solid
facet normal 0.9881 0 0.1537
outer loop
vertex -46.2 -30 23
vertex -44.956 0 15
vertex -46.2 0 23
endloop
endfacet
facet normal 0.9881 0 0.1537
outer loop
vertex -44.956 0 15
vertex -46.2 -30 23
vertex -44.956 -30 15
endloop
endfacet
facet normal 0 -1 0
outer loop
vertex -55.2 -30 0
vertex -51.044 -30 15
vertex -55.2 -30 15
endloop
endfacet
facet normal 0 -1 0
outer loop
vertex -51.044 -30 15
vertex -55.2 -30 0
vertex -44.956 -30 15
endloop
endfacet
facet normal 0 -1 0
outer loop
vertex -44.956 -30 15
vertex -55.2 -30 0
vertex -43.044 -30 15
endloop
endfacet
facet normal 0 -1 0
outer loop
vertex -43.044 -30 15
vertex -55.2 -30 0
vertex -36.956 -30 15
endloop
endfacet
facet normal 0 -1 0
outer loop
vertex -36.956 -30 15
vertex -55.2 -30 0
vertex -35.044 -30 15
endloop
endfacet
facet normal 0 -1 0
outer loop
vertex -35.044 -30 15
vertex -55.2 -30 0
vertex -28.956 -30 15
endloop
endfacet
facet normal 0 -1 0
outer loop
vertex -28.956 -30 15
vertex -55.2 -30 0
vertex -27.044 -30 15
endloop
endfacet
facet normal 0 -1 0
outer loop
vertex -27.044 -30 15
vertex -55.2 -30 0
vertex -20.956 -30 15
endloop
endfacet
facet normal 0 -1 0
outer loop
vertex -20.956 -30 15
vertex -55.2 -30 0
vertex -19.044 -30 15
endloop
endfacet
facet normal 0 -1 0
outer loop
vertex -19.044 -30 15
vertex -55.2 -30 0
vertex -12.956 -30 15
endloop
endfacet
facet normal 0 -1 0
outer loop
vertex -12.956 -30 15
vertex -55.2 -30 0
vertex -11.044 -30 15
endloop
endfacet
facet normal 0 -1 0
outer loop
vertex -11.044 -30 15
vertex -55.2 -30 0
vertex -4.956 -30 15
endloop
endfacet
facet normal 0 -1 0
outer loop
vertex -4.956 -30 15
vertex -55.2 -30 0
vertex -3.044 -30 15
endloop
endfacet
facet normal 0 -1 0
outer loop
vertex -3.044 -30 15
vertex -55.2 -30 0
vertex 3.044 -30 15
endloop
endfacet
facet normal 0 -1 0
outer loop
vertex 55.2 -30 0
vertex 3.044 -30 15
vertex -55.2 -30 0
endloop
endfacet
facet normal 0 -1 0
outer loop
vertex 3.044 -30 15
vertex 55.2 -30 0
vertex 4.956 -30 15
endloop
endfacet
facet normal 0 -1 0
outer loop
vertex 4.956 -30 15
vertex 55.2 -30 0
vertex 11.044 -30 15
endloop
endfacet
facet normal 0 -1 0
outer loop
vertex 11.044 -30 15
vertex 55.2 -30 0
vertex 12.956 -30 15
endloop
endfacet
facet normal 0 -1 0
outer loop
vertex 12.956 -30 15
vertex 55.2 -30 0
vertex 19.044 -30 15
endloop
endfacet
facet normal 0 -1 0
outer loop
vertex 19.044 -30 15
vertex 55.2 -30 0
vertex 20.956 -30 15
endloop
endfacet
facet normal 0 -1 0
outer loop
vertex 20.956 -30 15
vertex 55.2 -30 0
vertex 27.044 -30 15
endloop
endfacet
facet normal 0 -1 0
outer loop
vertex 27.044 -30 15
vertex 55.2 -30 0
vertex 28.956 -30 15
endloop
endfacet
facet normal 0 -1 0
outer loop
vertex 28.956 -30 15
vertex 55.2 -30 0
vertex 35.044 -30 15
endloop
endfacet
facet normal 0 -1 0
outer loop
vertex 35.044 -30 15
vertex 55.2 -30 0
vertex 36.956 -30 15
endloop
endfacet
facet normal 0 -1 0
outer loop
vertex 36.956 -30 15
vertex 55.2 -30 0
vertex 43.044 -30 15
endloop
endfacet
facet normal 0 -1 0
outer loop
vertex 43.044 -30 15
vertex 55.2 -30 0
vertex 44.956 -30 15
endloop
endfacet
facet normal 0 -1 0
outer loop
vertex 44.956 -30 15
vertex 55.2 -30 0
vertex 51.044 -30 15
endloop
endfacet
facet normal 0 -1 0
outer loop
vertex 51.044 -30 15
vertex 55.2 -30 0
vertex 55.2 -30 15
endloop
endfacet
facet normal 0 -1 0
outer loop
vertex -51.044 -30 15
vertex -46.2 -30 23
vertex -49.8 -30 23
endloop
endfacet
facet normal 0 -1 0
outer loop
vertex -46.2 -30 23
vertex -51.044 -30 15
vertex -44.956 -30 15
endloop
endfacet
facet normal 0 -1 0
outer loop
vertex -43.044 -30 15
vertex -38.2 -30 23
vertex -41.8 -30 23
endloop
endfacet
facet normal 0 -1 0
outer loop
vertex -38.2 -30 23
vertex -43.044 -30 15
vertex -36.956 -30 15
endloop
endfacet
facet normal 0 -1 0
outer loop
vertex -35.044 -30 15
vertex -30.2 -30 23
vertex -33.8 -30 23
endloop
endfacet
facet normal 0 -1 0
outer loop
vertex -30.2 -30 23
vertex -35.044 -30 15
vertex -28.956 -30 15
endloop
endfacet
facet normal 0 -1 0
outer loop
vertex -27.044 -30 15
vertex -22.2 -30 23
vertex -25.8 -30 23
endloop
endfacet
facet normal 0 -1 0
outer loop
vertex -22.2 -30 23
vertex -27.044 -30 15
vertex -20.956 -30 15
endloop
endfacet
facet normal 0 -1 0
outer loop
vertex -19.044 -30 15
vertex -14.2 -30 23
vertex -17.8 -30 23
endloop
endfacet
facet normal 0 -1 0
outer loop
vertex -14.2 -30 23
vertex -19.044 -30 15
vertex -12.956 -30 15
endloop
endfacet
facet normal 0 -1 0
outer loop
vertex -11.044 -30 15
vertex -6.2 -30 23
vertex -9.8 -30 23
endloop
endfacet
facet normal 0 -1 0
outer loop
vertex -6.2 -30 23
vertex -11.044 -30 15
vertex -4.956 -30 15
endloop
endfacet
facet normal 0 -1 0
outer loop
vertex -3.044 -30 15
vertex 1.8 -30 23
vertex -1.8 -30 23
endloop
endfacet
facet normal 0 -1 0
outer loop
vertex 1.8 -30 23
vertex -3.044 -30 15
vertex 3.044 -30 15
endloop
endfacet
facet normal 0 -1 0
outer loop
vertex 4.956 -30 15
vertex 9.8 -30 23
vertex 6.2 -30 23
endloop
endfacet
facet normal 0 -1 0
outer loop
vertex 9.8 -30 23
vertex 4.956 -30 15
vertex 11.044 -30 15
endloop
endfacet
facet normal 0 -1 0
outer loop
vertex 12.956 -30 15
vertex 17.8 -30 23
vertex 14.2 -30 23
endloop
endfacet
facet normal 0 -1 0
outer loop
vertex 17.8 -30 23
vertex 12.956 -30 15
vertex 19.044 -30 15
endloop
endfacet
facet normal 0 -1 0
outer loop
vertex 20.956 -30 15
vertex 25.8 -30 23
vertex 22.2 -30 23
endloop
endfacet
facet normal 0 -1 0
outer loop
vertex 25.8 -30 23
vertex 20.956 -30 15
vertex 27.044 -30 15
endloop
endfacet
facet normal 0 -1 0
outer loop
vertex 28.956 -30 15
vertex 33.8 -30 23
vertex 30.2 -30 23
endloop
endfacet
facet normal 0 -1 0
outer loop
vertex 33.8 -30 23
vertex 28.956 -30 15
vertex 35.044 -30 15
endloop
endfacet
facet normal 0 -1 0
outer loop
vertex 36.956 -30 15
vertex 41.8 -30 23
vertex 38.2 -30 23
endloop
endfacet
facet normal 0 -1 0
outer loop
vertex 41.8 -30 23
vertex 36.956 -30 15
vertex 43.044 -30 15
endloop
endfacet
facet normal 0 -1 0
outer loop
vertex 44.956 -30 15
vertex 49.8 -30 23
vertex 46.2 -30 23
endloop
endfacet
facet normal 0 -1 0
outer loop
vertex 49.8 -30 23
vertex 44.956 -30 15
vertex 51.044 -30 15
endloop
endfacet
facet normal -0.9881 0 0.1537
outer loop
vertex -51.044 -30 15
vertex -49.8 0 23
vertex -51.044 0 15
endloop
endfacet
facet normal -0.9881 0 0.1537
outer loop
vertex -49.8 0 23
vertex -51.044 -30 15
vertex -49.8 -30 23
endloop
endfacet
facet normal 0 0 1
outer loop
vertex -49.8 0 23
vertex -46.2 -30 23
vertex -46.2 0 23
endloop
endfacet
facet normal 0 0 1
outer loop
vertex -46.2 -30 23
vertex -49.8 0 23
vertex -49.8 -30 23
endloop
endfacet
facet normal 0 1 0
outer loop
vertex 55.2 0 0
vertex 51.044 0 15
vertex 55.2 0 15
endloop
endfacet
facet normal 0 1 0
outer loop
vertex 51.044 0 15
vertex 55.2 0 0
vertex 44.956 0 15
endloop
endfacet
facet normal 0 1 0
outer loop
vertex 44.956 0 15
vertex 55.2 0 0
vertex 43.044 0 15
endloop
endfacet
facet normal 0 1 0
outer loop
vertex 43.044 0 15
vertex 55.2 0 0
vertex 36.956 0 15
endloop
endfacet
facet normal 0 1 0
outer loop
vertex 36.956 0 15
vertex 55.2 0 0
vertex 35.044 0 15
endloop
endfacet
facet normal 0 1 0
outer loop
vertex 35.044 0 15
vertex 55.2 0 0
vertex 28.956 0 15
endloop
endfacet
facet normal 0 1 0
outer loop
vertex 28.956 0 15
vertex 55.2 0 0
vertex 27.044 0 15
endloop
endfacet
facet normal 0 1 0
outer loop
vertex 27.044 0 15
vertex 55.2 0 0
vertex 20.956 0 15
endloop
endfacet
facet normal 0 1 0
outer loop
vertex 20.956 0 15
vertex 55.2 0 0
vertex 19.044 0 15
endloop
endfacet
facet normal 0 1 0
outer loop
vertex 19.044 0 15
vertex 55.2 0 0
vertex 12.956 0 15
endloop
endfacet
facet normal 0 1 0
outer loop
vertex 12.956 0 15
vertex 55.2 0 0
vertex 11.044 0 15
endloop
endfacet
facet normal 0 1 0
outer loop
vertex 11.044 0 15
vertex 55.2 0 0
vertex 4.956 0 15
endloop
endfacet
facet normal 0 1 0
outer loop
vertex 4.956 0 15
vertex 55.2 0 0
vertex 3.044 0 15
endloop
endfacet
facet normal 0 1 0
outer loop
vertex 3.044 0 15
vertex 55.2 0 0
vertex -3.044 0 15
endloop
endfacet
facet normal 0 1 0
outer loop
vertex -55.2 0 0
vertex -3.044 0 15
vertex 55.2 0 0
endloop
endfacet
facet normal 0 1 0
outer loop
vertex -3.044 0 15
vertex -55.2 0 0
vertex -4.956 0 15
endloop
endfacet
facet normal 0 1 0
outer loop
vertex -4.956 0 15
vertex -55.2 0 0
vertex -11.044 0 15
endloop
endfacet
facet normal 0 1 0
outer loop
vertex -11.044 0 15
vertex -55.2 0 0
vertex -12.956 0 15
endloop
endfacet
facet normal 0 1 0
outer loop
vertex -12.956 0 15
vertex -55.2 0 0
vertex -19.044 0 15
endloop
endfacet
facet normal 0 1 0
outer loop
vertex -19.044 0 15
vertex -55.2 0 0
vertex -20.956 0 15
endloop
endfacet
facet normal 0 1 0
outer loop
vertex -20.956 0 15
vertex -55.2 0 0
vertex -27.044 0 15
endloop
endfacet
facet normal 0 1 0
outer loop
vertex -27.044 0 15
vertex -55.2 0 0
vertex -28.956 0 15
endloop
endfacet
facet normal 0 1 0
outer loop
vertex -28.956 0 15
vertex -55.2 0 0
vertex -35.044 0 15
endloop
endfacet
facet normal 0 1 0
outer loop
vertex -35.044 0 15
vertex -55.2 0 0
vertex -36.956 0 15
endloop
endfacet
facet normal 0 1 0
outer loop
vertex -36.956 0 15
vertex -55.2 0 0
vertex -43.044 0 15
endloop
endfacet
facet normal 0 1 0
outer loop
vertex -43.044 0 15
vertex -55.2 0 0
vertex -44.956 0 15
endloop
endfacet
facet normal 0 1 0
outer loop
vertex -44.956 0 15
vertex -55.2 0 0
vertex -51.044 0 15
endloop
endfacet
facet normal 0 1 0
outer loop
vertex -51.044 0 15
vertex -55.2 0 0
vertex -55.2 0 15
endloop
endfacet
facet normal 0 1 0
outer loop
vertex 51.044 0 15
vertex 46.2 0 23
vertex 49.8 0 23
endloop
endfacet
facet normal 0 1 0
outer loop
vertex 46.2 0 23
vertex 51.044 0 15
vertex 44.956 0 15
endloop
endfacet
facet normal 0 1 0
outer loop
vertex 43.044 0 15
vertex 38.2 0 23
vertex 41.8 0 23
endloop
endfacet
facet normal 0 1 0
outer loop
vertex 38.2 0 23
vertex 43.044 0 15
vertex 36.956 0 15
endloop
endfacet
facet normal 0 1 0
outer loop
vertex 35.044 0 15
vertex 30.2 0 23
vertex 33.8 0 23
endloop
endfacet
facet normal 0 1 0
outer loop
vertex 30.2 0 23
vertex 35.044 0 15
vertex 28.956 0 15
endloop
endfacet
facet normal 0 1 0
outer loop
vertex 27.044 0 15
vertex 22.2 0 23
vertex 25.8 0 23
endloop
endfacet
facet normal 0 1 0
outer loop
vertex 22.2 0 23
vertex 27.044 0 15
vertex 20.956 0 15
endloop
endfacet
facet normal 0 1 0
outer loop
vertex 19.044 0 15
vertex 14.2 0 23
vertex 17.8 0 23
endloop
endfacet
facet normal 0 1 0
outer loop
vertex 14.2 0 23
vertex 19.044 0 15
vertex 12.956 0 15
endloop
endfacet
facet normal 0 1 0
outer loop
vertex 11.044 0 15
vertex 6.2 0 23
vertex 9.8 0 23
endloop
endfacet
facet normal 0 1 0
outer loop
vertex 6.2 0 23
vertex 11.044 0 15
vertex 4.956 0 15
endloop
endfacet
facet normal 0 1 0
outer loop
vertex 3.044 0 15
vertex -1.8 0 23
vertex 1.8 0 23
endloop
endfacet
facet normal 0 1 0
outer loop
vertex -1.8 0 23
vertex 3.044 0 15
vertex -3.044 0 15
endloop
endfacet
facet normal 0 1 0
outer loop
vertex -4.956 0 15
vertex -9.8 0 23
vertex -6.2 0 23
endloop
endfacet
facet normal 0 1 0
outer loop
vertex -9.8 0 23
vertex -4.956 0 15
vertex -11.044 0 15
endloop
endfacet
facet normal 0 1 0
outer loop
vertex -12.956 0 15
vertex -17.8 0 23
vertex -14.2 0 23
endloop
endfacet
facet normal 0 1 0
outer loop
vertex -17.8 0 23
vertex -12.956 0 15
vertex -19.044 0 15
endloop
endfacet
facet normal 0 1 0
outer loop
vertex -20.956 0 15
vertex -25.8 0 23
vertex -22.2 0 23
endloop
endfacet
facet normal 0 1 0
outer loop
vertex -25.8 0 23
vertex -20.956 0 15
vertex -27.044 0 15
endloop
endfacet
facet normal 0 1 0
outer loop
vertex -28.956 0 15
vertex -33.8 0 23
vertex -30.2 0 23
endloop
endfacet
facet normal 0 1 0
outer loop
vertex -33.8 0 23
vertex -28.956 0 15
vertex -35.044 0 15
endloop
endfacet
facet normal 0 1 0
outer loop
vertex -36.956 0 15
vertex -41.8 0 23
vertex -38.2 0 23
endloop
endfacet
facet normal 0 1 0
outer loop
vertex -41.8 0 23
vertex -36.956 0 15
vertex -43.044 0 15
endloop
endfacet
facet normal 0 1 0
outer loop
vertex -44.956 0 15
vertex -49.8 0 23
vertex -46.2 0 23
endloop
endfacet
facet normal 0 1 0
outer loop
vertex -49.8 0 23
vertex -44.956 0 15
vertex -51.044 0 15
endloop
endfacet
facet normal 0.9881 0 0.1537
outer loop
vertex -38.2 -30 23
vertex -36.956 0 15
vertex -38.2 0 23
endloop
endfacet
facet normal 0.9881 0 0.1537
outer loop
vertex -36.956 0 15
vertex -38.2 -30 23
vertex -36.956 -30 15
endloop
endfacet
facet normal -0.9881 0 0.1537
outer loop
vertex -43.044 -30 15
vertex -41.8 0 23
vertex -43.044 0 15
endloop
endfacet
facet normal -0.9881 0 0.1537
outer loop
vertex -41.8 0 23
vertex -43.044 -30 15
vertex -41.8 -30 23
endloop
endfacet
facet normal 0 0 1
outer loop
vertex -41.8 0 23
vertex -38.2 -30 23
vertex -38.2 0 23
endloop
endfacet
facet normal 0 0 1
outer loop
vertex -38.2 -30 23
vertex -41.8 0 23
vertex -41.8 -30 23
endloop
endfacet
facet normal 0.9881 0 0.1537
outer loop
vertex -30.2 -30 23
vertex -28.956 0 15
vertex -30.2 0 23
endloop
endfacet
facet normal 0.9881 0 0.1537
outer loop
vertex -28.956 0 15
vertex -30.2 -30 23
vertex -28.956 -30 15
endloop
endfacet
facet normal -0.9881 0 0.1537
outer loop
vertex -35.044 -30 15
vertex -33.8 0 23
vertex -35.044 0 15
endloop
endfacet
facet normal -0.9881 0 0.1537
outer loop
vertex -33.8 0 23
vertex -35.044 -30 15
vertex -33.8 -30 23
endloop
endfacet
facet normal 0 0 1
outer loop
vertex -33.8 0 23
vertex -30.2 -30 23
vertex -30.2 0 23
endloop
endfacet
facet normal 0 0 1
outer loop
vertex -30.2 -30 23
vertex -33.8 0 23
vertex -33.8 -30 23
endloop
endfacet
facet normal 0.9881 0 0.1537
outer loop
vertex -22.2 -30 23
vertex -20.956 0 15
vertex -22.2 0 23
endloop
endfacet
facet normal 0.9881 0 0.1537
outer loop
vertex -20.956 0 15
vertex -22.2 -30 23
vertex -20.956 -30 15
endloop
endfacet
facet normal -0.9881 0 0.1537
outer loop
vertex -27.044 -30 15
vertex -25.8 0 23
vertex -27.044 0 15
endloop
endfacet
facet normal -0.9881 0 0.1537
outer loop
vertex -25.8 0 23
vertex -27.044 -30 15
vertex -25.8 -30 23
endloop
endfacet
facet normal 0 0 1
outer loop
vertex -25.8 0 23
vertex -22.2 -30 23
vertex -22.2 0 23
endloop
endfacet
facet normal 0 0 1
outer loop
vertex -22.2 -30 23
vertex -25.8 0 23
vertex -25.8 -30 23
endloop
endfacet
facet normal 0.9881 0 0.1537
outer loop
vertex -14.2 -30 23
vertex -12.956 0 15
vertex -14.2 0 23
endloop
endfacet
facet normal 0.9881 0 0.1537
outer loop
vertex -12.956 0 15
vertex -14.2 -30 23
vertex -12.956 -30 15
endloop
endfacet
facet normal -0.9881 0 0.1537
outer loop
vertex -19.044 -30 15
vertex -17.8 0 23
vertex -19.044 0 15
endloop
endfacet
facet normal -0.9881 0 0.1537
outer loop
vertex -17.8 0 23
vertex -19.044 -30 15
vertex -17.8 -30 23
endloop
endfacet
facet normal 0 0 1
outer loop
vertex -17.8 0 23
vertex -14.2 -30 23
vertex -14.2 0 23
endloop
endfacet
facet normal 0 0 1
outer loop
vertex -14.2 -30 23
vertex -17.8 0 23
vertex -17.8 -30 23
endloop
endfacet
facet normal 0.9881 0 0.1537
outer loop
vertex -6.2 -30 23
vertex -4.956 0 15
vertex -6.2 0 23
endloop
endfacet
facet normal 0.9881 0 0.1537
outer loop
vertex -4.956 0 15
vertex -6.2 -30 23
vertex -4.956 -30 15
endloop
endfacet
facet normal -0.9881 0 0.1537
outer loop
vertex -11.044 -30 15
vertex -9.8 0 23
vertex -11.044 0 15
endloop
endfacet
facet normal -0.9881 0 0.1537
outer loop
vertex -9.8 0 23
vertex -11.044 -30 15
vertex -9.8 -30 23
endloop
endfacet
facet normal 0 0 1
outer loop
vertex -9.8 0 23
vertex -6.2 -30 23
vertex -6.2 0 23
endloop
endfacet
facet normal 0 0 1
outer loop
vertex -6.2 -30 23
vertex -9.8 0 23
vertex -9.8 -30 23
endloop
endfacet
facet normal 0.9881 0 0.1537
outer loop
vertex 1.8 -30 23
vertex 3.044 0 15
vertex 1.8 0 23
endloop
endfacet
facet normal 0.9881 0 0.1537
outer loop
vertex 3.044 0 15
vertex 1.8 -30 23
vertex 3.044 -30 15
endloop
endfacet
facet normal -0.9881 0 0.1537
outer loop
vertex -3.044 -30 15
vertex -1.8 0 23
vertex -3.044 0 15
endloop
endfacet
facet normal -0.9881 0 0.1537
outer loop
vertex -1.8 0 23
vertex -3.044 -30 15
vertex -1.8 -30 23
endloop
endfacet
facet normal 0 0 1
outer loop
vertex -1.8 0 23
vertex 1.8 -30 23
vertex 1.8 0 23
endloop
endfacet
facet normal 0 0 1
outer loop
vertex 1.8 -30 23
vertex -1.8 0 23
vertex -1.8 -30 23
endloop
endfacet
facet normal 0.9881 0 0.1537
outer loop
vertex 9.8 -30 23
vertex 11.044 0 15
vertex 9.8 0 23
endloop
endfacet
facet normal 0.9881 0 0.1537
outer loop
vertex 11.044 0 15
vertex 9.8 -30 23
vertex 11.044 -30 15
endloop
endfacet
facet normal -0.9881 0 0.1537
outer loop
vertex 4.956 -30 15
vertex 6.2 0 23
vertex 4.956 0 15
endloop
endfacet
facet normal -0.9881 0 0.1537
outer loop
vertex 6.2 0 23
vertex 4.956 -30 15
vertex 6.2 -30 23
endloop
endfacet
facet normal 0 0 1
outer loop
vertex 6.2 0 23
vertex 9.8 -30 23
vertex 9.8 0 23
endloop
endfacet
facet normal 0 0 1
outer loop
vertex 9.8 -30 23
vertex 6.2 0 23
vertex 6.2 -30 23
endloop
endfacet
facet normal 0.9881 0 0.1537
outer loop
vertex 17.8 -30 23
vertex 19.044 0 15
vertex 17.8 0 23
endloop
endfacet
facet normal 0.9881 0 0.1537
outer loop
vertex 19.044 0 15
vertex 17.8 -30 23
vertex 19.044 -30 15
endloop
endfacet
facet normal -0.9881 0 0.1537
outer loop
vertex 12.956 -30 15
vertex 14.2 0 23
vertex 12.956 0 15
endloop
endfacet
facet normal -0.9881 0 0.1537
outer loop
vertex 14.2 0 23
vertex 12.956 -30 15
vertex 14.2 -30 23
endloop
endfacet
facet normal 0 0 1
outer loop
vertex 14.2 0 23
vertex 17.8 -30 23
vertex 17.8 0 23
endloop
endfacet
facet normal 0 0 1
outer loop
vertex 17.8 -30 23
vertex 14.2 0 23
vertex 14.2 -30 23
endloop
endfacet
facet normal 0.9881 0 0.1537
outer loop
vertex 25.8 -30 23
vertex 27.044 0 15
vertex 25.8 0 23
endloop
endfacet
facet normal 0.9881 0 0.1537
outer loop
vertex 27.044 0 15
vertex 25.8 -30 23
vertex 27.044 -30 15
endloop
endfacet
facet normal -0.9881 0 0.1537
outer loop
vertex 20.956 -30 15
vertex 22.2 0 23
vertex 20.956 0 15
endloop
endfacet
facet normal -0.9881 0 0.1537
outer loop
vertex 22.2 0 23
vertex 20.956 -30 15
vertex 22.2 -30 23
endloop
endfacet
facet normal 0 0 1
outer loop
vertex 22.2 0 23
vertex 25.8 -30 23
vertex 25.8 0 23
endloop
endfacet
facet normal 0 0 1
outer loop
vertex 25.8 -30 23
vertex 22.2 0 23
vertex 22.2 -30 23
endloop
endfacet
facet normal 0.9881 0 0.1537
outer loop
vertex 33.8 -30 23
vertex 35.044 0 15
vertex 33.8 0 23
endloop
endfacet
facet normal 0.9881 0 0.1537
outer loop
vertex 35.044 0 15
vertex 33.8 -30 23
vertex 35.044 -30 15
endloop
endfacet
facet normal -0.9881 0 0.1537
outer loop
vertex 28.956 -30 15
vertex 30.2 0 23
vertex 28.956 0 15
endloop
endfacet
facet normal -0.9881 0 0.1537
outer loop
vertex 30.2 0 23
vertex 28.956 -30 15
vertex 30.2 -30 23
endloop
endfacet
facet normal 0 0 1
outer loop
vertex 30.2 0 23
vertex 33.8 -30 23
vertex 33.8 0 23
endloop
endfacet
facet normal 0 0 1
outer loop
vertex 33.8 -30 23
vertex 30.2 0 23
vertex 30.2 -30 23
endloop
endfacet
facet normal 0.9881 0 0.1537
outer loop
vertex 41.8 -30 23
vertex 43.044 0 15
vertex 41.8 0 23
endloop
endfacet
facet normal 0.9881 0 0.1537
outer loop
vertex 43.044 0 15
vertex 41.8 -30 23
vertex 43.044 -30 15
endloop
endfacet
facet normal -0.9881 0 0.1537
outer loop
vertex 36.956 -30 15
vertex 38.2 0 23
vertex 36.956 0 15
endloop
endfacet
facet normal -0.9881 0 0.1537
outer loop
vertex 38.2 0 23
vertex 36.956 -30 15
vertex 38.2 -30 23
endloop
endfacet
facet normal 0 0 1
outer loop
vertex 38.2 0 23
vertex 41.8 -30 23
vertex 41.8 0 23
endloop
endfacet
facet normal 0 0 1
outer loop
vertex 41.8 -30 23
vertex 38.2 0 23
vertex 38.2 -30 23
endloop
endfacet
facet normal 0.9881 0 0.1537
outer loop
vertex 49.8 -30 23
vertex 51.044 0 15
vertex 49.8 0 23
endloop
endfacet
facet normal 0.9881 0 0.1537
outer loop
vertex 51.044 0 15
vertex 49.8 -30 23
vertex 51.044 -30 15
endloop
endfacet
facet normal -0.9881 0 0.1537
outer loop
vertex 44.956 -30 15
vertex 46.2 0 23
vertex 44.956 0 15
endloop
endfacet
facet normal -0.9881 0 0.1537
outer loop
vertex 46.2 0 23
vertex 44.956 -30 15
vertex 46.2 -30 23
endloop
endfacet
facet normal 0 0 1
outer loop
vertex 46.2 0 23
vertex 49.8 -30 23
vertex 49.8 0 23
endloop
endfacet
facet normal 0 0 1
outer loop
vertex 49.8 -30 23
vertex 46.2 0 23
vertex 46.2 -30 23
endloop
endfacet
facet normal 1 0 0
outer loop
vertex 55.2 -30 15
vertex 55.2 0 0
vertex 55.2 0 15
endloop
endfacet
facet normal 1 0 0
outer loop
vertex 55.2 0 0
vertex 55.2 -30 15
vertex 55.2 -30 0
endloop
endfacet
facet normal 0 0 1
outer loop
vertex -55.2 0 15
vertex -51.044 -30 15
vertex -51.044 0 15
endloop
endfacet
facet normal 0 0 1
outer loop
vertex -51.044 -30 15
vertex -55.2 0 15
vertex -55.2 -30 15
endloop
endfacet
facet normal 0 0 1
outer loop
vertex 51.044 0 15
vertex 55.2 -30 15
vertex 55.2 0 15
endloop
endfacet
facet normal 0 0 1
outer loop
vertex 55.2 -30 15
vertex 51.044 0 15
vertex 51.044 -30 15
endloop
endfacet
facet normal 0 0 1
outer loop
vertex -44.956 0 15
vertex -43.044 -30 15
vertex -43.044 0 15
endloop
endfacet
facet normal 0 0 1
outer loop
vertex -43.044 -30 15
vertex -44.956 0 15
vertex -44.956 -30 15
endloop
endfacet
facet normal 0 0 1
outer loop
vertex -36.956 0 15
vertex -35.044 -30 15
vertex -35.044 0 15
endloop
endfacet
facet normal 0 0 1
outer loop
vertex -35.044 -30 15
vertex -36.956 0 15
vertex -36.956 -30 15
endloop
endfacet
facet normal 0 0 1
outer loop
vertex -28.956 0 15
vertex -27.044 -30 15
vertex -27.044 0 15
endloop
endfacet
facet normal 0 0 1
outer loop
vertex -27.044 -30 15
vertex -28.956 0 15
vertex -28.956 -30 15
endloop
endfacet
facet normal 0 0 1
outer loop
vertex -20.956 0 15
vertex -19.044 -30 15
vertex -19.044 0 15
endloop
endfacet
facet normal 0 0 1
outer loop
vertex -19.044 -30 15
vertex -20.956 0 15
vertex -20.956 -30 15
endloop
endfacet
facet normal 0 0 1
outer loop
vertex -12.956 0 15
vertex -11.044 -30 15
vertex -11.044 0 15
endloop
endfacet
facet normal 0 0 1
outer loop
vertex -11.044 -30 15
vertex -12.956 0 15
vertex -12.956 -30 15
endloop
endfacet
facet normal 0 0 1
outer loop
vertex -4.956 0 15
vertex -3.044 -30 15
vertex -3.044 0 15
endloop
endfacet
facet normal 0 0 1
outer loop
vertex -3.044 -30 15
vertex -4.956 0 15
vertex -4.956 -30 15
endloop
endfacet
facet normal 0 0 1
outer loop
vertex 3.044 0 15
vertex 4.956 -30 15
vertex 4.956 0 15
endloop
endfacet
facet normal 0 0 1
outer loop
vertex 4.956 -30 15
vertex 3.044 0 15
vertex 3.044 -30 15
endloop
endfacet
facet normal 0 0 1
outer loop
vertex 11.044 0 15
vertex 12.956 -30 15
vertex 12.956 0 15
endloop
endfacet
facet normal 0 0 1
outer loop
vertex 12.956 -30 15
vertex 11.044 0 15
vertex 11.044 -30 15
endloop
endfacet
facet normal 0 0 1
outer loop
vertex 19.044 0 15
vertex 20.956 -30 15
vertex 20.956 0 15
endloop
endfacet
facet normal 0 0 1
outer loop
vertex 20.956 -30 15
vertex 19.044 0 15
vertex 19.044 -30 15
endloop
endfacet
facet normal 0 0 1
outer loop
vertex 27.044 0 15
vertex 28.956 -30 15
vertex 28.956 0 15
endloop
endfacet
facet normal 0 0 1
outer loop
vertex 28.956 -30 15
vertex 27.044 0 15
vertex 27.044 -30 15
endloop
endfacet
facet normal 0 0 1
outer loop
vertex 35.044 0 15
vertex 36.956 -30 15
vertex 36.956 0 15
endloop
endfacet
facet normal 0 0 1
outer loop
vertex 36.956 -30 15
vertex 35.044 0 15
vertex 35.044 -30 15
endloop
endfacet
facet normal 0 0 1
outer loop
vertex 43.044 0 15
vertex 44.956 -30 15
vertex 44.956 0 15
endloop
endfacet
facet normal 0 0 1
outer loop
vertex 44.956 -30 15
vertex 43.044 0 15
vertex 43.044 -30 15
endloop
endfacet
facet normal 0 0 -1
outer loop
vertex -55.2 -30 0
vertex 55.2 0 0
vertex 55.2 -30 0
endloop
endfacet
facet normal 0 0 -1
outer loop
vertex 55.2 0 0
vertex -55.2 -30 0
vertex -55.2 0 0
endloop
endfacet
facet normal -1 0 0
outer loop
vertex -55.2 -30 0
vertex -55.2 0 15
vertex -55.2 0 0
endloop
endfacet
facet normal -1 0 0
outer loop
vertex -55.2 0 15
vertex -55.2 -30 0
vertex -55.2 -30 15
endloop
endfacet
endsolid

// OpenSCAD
$fn = 32;

// ----------------------------------------------------------------------
// Toothed rack, 13 teeth
// 8 mm pitch, 8 mm teeth
// ----------------------------------------------------------------------

// --- parameters (mm) ---
bar_w = 30;     // bar width (Y)
bar_h = 15;     // bar height (Z)
teeth = 13;     // number of teeth
pitch = 8;      // tooth pitch
tooth_h = 8;    // tooth height above the bar
root_w = 6.4;   // tooth width at the root
crest_w = 3.6;  // tooth width at the crest

// --- derived feature positions (mm) ---
span = (teeth - 1) * pitch;  // = 96   distance between the outer teeth
bar_l = span + root_w + 8;   // = 110.4   bar length: teeth plus 4 mm at each end
tooth_x = -span / 2;         // = -48   X of the first tooth
height = bar_h + tooth_h;    // = 23   overall height
feature_centers = [
  [tooth_x + 0 * pitch, -bar_w / 2],
  [tooth_x + 1 * pitch, -bar_w / 2],
  [tooth_x + 2 * pitch, -bar_w / 2],
  [tooth_x + 3 * pitch, -bar_w / 2],
  [tooth_x + 4 * pitch, -bar_w / 2],
  [tooth_x + 5 * pitch, -bar_w / 2],
  [tooth_x + 6 * pitch, -bar_w / 2],
  [tooth_x + 7 * pitch, -bar_w / 2],
  [tooth_x + 8 * pitch, -bar_w / 2],
  [tooth_x + 9 * pitch, -bar_w / 2],
  [tooth_x + 10 * pitch, -bar_w / 2],
  [tooth_x + 11 * pitch, -bar_w / 2],
  [tooth_x + 12 * pitch, -bar_w / 2]
];   // tooth centre line, drives the tooth loop

// bar with a rack of teeth, one extruded trapezoium per centre
module rack_tooth() {
  linear_extrude(height = bar_w)
    polygon(points = [
      [0, 0],
      [root_w, 0],
      [root_w / 2 + crest_w / 2, tooth_h + 1],
      [root_w / 2 - crest_w / 2, tooth_h + 1]
    ]);
}

union() {
  translate([-bar_l / 2, -bar_w, 0]) cube([bar_l, bar_w, bar_h]);
  for (centre = feature_centers)
    translate([centre[0] - root_w / 2, 0, bar_h - 1]) rotate([90, 0, 0]) rack_tooth();
}
